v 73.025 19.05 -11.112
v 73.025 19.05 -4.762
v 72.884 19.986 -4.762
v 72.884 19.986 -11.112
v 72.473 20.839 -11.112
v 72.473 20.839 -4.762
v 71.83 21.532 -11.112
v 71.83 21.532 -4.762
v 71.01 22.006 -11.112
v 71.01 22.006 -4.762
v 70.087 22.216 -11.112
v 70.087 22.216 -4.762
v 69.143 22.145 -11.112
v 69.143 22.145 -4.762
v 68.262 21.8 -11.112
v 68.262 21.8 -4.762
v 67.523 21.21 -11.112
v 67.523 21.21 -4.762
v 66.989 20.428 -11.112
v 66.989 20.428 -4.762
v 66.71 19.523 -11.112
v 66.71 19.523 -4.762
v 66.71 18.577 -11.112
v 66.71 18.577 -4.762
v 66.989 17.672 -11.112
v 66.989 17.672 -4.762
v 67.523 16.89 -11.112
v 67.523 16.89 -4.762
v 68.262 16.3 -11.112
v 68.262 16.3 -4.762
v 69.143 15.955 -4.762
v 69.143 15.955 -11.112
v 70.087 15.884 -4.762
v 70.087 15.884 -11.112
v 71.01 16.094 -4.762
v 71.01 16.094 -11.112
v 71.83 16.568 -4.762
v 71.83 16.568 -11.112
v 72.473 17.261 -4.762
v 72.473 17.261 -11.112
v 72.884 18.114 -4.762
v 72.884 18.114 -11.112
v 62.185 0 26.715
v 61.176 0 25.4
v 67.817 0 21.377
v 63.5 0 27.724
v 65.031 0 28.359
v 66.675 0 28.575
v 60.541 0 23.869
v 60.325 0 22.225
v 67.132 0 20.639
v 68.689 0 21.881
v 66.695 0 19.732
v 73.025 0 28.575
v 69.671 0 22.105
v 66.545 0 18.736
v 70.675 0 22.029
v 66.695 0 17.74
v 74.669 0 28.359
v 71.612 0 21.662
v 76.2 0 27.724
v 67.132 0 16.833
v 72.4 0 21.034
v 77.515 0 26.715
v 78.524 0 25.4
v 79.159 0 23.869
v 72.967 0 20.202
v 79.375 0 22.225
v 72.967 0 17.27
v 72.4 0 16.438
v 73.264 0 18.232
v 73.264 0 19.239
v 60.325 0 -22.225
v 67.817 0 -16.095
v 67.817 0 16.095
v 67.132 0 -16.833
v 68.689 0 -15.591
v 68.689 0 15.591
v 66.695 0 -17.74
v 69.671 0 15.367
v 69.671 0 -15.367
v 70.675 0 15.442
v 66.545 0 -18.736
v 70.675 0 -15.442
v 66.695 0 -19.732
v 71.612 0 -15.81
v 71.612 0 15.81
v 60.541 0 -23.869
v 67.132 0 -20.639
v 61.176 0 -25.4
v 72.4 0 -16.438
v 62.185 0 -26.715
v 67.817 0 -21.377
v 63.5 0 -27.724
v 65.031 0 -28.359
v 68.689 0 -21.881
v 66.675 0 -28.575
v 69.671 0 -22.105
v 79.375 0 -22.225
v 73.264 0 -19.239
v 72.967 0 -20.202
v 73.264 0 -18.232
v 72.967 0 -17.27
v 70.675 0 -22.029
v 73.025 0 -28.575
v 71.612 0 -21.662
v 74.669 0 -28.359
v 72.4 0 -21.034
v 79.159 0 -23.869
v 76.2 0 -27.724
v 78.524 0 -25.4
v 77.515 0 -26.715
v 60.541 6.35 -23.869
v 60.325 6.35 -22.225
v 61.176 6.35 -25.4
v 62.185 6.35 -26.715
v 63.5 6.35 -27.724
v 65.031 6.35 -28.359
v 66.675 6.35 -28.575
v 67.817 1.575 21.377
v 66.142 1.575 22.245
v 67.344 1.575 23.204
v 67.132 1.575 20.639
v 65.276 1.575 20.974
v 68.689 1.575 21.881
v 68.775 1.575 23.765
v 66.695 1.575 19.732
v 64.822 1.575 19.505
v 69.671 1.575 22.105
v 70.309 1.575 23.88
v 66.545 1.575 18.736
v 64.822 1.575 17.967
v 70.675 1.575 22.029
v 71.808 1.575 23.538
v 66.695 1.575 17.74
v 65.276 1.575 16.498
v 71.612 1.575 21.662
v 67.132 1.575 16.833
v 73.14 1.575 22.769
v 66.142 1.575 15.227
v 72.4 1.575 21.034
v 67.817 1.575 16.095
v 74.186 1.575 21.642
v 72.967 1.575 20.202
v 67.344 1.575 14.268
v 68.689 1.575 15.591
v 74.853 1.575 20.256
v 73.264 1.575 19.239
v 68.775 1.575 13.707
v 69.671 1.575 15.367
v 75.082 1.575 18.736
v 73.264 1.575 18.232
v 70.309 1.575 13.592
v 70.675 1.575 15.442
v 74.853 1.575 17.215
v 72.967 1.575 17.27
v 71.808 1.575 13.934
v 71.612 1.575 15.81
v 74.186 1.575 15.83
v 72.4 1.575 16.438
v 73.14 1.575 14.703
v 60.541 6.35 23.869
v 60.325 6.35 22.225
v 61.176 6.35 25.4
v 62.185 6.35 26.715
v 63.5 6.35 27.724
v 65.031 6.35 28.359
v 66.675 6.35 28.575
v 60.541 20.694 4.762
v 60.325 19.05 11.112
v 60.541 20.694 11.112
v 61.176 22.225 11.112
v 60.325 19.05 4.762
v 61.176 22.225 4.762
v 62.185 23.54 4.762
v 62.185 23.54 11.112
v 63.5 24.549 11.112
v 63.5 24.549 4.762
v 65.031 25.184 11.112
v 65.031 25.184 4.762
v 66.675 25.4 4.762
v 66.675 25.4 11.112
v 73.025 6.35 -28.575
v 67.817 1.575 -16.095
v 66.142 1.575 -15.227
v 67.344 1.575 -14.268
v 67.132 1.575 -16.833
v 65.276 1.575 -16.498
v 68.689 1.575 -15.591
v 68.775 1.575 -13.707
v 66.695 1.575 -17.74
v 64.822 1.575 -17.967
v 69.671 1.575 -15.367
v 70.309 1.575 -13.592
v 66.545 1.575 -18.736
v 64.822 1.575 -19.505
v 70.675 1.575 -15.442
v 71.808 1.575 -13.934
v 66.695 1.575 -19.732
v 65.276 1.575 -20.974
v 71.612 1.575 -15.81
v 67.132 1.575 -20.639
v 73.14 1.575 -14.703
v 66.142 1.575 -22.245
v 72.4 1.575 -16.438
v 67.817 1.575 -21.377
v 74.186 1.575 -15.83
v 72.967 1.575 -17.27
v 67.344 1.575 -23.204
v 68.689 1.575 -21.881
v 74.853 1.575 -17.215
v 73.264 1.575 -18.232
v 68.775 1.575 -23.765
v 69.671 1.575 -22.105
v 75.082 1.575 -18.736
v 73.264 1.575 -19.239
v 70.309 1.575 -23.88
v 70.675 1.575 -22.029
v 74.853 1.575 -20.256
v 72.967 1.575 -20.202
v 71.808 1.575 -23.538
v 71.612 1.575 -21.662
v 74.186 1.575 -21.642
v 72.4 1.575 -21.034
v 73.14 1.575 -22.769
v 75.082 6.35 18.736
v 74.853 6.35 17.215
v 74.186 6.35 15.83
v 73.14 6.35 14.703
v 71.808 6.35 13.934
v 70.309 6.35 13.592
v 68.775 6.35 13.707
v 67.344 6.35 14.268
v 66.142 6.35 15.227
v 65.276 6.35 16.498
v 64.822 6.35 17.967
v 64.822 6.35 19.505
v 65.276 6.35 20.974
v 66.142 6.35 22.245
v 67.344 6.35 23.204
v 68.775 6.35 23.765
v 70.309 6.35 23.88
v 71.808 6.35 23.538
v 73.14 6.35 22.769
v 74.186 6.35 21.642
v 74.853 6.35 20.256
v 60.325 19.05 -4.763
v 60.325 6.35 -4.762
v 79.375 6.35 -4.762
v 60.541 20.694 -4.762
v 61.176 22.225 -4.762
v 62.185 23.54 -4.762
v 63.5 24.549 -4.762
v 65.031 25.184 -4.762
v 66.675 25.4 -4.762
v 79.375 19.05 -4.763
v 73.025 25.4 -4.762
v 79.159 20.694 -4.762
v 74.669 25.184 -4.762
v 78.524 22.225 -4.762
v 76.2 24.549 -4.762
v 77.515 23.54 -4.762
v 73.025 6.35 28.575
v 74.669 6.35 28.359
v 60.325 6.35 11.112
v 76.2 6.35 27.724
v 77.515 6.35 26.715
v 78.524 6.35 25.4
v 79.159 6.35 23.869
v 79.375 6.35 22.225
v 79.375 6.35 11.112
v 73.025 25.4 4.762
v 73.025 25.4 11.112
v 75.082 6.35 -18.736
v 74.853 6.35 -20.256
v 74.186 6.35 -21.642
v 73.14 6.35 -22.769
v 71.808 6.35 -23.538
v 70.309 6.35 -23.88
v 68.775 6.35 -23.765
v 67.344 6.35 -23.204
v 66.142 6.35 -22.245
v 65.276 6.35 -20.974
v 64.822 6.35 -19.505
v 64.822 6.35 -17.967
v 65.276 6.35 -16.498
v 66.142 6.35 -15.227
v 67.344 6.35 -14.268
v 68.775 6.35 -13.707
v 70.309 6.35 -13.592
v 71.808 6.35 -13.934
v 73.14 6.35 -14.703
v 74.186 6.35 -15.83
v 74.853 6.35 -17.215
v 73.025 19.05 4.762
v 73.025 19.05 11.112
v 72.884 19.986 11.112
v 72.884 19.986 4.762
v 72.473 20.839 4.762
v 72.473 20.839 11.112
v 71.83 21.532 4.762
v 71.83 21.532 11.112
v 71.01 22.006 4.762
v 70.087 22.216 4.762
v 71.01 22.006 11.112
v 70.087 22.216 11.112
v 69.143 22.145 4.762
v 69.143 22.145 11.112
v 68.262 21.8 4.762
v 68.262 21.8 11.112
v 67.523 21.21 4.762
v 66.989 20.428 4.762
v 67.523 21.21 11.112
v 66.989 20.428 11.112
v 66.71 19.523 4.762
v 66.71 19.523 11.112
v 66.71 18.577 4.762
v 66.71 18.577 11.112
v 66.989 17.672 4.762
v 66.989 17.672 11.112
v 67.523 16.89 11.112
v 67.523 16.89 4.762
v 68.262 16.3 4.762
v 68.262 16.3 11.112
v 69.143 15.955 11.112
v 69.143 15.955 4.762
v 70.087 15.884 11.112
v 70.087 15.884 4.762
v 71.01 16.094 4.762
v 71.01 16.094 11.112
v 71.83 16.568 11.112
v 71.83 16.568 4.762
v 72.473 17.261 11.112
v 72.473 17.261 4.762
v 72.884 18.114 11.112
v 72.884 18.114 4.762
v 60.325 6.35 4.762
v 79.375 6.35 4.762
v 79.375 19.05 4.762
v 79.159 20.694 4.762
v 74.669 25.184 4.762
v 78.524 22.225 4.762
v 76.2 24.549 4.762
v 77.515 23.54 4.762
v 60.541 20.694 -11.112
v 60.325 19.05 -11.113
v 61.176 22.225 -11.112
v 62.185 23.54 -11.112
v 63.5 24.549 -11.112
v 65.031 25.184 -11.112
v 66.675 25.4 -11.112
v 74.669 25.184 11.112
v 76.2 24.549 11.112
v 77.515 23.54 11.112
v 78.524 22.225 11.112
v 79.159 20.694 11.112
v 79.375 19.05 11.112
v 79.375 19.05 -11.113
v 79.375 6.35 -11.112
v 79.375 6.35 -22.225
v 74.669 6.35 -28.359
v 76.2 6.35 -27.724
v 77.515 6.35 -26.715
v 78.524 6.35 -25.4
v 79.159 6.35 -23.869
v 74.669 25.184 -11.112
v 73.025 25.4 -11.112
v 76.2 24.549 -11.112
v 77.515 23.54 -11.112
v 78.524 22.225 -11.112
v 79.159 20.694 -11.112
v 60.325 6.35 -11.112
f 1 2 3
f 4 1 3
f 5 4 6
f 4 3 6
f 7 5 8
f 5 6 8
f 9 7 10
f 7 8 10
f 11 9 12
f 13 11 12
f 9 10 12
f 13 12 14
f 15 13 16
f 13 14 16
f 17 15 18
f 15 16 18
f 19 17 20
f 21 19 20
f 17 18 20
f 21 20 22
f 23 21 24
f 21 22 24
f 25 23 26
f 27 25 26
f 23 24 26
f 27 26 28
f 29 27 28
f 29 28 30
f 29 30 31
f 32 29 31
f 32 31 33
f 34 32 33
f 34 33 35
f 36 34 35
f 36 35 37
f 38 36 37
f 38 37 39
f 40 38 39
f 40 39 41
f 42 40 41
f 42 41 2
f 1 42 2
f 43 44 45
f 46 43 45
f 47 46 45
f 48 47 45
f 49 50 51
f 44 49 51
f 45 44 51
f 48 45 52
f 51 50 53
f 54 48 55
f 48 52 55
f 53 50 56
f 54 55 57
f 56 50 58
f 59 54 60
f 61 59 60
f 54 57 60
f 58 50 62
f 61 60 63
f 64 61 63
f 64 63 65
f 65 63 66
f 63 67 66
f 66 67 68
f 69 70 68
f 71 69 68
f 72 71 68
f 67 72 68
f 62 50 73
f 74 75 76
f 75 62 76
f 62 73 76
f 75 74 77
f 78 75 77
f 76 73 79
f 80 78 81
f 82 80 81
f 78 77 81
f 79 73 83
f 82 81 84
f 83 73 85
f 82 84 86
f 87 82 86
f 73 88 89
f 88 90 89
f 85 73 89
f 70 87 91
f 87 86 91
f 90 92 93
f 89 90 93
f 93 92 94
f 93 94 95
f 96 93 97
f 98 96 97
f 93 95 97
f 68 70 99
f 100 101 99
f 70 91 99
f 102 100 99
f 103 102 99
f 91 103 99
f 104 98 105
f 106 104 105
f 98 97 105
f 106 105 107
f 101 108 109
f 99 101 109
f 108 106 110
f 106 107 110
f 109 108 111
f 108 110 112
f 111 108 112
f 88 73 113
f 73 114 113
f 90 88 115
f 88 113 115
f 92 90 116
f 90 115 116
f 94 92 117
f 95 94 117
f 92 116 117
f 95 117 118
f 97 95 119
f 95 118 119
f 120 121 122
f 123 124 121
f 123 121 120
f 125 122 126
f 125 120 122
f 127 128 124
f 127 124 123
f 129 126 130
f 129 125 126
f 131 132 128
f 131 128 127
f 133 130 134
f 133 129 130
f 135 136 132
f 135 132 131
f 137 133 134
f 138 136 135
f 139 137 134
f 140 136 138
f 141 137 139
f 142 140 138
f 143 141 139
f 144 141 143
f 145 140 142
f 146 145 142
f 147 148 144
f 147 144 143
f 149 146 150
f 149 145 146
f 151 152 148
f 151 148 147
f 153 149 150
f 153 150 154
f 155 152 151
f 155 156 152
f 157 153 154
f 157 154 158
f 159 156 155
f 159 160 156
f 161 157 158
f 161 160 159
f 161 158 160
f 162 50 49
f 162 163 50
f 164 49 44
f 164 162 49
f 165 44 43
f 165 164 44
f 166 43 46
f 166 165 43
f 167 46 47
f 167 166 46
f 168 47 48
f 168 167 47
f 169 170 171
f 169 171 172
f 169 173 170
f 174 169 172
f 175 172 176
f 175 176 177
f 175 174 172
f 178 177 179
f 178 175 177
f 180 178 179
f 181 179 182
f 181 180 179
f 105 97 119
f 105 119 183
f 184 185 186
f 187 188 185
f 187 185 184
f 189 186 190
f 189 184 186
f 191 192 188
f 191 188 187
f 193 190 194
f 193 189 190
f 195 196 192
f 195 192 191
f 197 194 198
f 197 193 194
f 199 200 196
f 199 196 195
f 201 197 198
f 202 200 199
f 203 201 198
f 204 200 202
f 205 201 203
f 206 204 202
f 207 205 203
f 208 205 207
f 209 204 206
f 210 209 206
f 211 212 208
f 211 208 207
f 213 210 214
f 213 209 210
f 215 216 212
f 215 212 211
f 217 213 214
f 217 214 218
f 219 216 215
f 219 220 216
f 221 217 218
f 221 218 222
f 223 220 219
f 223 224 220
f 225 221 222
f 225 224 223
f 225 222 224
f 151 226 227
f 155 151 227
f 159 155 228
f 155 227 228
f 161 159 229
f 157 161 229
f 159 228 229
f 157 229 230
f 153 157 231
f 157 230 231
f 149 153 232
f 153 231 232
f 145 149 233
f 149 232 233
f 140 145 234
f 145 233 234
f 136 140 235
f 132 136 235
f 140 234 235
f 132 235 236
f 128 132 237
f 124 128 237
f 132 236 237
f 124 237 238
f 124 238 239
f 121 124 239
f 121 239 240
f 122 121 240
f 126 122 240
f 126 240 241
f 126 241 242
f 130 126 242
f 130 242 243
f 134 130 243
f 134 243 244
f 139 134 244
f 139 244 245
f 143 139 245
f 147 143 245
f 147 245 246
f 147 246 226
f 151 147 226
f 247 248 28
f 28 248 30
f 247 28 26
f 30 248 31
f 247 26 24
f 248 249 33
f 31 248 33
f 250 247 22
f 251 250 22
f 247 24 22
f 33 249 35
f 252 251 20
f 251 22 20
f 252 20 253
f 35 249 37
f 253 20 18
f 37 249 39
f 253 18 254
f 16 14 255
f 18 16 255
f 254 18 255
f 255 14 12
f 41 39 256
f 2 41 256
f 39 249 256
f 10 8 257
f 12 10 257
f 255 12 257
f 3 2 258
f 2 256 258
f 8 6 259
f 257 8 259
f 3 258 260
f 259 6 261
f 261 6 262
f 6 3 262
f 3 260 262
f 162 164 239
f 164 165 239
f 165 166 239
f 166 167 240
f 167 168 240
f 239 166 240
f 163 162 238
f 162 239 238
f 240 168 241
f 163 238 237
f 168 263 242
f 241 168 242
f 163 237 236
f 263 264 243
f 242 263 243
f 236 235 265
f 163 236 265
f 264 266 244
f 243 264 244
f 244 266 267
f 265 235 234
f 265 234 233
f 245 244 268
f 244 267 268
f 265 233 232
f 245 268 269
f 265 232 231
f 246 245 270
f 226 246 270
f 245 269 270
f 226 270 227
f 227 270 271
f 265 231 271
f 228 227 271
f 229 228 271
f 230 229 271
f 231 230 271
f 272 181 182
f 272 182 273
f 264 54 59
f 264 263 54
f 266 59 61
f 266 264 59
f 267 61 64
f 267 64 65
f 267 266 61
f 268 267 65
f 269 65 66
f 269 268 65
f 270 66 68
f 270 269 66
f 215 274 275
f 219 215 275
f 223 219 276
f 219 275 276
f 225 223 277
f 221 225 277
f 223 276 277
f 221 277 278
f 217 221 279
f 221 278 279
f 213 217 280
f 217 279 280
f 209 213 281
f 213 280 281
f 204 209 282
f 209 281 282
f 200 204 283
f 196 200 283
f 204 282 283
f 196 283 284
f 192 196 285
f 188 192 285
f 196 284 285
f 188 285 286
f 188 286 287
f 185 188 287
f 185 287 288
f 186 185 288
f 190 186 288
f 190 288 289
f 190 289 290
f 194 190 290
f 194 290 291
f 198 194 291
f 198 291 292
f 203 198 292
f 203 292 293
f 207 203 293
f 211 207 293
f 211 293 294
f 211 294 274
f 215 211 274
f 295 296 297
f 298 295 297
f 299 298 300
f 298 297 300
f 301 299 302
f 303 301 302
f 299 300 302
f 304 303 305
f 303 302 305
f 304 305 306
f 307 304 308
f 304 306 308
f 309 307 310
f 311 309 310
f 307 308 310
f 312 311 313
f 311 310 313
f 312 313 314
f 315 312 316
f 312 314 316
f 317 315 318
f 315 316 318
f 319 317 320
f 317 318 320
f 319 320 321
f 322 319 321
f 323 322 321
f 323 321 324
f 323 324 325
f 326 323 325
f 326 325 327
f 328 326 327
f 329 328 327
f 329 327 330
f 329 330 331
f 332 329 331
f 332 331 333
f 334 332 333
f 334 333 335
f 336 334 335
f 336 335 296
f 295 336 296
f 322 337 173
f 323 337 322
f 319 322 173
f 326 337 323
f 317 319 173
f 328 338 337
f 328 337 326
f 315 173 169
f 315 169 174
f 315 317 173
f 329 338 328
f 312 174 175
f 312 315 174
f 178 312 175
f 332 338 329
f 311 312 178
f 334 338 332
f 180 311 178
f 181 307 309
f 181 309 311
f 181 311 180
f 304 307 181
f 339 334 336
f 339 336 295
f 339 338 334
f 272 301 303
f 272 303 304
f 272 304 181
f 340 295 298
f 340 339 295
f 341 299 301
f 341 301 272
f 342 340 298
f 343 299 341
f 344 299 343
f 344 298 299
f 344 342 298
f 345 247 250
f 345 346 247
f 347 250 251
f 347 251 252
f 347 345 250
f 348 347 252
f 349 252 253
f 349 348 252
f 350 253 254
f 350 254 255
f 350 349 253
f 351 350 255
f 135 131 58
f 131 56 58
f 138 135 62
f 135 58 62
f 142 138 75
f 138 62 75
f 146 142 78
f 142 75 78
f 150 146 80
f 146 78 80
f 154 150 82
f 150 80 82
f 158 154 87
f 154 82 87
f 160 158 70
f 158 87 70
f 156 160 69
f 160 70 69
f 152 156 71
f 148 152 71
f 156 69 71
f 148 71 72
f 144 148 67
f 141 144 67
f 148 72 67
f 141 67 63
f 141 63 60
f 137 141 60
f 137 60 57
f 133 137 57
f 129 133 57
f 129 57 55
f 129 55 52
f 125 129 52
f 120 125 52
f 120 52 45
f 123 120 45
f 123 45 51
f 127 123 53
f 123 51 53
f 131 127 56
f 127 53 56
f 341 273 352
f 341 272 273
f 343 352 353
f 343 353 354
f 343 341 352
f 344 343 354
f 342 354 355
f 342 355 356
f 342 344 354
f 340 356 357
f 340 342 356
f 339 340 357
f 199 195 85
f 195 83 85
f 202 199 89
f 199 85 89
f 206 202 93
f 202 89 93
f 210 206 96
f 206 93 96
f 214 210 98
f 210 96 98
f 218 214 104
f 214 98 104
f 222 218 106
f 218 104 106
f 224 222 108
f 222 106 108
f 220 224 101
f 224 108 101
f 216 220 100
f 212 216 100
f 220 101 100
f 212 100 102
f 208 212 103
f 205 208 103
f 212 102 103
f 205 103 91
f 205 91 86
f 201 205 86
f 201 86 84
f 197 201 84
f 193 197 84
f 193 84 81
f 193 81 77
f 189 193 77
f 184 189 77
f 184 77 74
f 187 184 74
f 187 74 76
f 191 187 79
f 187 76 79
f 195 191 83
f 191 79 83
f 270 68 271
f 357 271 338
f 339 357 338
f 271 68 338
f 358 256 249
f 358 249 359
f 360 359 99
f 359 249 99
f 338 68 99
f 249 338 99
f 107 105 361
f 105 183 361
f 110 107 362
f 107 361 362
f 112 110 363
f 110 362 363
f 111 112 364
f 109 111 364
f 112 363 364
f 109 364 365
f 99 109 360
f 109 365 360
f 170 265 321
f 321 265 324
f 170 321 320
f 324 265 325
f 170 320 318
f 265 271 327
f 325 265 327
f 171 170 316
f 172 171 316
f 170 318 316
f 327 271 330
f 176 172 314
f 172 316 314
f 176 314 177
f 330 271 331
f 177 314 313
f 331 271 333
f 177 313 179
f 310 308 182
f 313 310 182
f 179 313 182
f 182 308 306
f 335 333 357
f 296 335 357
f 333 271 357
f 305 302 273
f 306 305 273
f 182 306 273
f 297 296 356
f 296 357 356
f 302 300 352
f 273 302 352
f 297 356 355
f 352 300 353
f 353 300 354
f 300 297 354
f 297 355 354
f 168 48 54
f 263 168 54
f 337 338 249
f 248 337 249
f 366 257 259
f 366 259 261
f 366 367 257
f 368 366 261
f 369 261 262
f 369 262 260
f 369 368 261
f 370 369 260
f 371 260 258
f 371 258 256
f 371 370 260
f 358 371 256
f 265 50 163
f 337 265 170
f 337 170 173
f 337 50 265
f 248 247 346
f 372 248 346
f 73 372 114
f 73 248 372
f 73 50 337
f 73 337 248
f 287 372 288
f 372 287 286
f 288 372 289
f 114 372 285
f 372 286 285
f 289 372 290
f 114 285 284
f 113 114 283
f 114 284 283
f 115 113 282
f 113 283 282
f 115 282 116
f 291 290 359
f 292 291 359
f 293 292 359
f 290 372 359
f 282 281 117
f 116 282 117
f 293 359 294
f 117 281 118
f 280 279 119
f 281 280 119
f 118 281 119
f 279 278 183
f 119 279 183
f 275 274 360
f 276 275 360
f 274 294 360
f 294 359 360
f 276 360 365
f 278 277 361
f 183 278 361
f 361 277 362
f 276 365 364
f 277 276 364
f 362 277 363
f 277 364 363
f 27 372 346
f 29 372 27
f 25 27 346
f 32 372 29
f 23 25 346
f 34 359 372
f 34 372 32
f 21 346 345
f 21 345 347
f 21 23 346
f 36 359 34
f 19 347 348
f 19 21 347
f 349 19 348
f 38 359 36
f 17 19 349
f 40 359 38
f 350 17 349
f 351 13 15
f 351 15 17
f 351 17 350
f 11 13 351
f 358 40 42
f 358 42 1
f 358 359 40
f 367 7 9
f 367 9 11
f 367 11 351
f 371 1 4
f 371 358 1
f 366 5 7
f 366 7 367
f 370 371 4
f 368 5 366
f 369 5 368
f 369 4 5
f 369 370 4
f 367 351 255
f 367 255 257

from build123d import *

# Parameters (mm, degrees)
SKETCH1_W                                        = 19.05
SKETCH1_H                                        = 57.15
BOSS_EXTRUDE1_DEPTH                              = 25.4
SKETCH2_W                                        = 17.4625
SKETCH2_H                                        = 19.05
SKETCH2_W_2                                      = 9.525
CUT_EXTRUDE1_DEPTH                               = 20.05
SKETCH9_R                                        = 3.175
CUT_EXTRUDE3_DEPTH                               = 40.6875
FILLET1_R                                        = 6.35
CBORE_FOR_1_4_SOCKET_SHOULDER_SCREW1_D           = 6.7564
CBORE_FOR_1_4_SOCKET_SHOULDER_SCREW1_CBORE_D     = 10.31748
CBORE_FOR_1_4_SOCKET_SHOULDER_SCREW1_CBORE_DEPTH = 4.7752


with BuildPart() as part:
    # Sketch1 → Boss-Extrude1 (new body)
    with BuildSketch(Plane(origin=(0, 0, 0), x_dir=(1, 0, 0), z_dir=(0, 1, 0))):
        with Locations((69.85, 0)):
            Rectangle(SKETCH1_W, SKETCH1_H)
    extrude(amount=BOSS_EXTRUDE1_DEPTH)

    # Sketch2 → Cut-Extrude1 (cut, through all)
    with BuildSketch(Plane(origin=(79.375, 0, 0), x_dir=(0, 0, -1), z_dir=(1, 0, 0))):
        with Locations((-19.84375, 15.875)):
            Rectangle(SKETCH2_W, SKETCH2_H)
        with Locations((0, 15.875)):
            Rectangle(SKETCH2_W_2, SKETCH2_H)
        with Locations((19.84375, 15.875)):
            Rectangle(SKETCH2_W, SKETCH2_H)
    extrude(amount=-CUT_EXTRUDE1_DEPTH, mode=Mode.SUBTRACT)

    # Sketch9 → Cut-Extrude3 (cut, through all)
    with BuildSketch(Plane.XY.offset(11.1125)):
        with Locations((69.85, 19.05)):
            Circle(SKETCH9_R)
    extrude(amount=-CUT_EXTRUDE3_DEPTH, mode=Mode.SUBTRACT)

    # Fillet1
    fillet1_edges = [part.edges().sort_by_distance(p)[0] for p in [
        (79.375, 25.4, 7.9375),
        (79.375, 3.175, 28.575),
        (60.325, 3.175, 28.575),
        (79.375, 25.4, -7.9375),
        (60.325, 25.4, -7.9375),
        (60.325, 25.4, 7.9375),
        (60.325, 3.175, -28.575),
        (79.375, 3.175, -28.575),
    ]]
    fillet(fillet1_edges, radius=FILLET1_R)

    # CBORE for 1/4 Socket Shoulder Screw1 (through all)
    with Locations(Plane(origin=(0, 6.35, 0), x_dir=(1, 0, 0), z_dir=(0, 1, 0))):
        with Locations((69.923370565, 18.735910675), (69.923370565, -18.735910675)):
            CounterBoreHole(CBORE_FOR_1_4_SOCKET_SHOULDER_SCREW1_D / 2, CBORE_FOR_1_4_SOCKET_SHOULDER_SCREW1_CBORE_D / 2, CBORE_FOR_1_4_SOCKET_SHOULDER_SCREW1_CBORE_DEPTH)


solid = part.part
